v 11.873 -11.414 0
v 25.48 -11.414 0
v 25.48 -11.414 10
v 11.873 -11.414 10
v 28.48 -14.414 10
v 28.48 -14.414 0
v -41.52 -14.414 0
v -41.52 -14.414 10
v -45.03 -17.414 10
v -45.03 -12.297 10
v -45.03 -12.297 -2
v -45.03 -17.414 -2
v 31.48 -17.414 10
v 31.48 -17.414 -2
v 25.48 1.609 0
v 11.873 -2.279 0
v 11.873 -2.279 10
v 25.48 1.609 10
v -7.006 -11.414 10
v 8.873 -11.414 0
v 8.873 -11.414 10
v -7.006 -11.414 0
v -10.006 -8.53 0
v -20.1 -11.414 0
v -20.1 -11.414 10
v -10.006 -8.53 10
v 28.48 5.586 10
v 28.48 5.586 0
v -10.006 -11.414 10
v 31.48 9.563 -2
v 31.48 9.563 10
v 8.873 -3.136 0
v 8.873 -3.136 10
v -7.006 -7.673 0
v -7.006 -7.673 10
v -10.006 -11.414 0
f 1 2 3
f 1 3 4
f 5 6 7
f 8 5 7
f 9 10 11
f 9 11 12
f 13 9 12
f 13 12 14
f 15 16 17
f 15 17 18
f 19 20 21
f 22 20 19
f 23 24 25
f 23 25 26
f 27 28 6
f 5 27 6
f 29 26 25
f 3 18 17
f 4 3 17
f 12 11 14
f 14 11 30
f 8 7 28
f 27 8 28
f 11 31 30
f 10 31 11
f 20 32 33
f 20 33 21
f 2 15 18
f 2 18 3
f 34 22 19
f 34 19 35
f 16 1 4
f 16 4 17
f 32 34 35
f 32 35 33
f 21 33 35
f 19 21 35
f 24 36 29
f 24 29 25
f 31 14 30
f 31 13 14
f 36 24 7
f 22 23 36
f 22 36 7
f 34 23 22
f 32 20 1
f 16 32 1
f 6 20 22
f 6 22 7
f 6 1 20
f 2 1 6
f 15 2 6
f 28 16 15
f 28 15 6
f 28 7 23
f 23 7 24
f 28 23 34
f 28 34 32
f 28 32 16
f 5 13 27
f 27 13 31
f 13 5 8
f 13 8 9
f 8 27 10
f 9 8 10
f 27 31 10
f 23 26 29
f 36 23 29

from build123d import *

# Parameters (mm, degrees)
BOSS_EXTRUDE1_DEPTH   = 10
BOSS_EXTRUDE1_2_DEPTH = 10
BOSS_EXTRUDE1_3_DEPTH = 10
BOSS_EXTRUDE1_4_DEPTH = 10
BOSS_EXTRUDE2_DEPTH   = 2


with BuildPart() as part:
    # Sketch1 → Boss-Extrude1 (new body)
    with BuildSketch(Plane.XY):
        Polygon((-45.029672623, -17.414149003), (-45.029672623, -12.296865077), (31.479998469, 9.563040949), (31.479998469, -17.414149003), align=None)
        Polygon((28.479998469, -14.414149003), (-41.520001531, -14.414149003), (28.479998469, 5.585850997), align=None, mode=Mode.SUBTRACT)
    extrude(amount=BOSS_EXTRUDE1_DEPTH)



with BuildPart() as body_2:
    # Sketch1 → Boss-Extrude1 2 (new body)
    with BuildSketch(Plane.XY):
        Polygon((-20.099836697, -11.414149003), (-10.005608589, -8.530083829), (-10.005608589, -11.414149003), align=None)
    extrude(amount=BOSS_EXTRUDE1_2_DEPTH)


with BuildPart() as body_3:
    # Sketch1 → Boss-Extrude1 3 (new body)
    with BuildSketch(Plane.XY):
        Polygon((-7.005608589, -7.672940972), (8.872659236, -3.136293022), (8.872659236, -11.414149003), (-7.005608589, -11.414149003), align=None)
    extrude(amount=BOSS_EXTRUDE1_3_DEPTH)


with BuildPart() as body_4:
    # Sketch1 → Boss-Extrude1 4 (new body)
    with BuildSketch(Plane.XY):
        Polygon((11.872659236, -2.279150165), (25.479998469, 1.608661044), (25.479998469, -11.414149003), (11.872659236, -11.414149003), align=None)
    extrude(amount=BOSS_EXTRUDE1_4_DEPTH)


with BuildPart() as part_1:
    add(part.part)

    add(body_2.part)  # Boss-Extrude2 merges body 2

    add(body_3.part)  # Boss-Extrude2 merges body 3

    add(body_4.part)  # Boss-Extrude2 merges body 4
    # Sketch2 → Boss-Extrude2 (add)
    with BuildSketch(Plane(origin=(0, 0, 0), x_dir=(-1, 0, 0), z_dir=(0, 0, -1))):
        Polygon((-31.479998469, 9.563040949), (45.029672623, -12.296865077), (45.029672623, -17.414149003), (-31.479998469, -17.414149003), align=None)
    extrude(amount=BOSS_EXTRUDE2_DEPTH)


solid = part_1.part
